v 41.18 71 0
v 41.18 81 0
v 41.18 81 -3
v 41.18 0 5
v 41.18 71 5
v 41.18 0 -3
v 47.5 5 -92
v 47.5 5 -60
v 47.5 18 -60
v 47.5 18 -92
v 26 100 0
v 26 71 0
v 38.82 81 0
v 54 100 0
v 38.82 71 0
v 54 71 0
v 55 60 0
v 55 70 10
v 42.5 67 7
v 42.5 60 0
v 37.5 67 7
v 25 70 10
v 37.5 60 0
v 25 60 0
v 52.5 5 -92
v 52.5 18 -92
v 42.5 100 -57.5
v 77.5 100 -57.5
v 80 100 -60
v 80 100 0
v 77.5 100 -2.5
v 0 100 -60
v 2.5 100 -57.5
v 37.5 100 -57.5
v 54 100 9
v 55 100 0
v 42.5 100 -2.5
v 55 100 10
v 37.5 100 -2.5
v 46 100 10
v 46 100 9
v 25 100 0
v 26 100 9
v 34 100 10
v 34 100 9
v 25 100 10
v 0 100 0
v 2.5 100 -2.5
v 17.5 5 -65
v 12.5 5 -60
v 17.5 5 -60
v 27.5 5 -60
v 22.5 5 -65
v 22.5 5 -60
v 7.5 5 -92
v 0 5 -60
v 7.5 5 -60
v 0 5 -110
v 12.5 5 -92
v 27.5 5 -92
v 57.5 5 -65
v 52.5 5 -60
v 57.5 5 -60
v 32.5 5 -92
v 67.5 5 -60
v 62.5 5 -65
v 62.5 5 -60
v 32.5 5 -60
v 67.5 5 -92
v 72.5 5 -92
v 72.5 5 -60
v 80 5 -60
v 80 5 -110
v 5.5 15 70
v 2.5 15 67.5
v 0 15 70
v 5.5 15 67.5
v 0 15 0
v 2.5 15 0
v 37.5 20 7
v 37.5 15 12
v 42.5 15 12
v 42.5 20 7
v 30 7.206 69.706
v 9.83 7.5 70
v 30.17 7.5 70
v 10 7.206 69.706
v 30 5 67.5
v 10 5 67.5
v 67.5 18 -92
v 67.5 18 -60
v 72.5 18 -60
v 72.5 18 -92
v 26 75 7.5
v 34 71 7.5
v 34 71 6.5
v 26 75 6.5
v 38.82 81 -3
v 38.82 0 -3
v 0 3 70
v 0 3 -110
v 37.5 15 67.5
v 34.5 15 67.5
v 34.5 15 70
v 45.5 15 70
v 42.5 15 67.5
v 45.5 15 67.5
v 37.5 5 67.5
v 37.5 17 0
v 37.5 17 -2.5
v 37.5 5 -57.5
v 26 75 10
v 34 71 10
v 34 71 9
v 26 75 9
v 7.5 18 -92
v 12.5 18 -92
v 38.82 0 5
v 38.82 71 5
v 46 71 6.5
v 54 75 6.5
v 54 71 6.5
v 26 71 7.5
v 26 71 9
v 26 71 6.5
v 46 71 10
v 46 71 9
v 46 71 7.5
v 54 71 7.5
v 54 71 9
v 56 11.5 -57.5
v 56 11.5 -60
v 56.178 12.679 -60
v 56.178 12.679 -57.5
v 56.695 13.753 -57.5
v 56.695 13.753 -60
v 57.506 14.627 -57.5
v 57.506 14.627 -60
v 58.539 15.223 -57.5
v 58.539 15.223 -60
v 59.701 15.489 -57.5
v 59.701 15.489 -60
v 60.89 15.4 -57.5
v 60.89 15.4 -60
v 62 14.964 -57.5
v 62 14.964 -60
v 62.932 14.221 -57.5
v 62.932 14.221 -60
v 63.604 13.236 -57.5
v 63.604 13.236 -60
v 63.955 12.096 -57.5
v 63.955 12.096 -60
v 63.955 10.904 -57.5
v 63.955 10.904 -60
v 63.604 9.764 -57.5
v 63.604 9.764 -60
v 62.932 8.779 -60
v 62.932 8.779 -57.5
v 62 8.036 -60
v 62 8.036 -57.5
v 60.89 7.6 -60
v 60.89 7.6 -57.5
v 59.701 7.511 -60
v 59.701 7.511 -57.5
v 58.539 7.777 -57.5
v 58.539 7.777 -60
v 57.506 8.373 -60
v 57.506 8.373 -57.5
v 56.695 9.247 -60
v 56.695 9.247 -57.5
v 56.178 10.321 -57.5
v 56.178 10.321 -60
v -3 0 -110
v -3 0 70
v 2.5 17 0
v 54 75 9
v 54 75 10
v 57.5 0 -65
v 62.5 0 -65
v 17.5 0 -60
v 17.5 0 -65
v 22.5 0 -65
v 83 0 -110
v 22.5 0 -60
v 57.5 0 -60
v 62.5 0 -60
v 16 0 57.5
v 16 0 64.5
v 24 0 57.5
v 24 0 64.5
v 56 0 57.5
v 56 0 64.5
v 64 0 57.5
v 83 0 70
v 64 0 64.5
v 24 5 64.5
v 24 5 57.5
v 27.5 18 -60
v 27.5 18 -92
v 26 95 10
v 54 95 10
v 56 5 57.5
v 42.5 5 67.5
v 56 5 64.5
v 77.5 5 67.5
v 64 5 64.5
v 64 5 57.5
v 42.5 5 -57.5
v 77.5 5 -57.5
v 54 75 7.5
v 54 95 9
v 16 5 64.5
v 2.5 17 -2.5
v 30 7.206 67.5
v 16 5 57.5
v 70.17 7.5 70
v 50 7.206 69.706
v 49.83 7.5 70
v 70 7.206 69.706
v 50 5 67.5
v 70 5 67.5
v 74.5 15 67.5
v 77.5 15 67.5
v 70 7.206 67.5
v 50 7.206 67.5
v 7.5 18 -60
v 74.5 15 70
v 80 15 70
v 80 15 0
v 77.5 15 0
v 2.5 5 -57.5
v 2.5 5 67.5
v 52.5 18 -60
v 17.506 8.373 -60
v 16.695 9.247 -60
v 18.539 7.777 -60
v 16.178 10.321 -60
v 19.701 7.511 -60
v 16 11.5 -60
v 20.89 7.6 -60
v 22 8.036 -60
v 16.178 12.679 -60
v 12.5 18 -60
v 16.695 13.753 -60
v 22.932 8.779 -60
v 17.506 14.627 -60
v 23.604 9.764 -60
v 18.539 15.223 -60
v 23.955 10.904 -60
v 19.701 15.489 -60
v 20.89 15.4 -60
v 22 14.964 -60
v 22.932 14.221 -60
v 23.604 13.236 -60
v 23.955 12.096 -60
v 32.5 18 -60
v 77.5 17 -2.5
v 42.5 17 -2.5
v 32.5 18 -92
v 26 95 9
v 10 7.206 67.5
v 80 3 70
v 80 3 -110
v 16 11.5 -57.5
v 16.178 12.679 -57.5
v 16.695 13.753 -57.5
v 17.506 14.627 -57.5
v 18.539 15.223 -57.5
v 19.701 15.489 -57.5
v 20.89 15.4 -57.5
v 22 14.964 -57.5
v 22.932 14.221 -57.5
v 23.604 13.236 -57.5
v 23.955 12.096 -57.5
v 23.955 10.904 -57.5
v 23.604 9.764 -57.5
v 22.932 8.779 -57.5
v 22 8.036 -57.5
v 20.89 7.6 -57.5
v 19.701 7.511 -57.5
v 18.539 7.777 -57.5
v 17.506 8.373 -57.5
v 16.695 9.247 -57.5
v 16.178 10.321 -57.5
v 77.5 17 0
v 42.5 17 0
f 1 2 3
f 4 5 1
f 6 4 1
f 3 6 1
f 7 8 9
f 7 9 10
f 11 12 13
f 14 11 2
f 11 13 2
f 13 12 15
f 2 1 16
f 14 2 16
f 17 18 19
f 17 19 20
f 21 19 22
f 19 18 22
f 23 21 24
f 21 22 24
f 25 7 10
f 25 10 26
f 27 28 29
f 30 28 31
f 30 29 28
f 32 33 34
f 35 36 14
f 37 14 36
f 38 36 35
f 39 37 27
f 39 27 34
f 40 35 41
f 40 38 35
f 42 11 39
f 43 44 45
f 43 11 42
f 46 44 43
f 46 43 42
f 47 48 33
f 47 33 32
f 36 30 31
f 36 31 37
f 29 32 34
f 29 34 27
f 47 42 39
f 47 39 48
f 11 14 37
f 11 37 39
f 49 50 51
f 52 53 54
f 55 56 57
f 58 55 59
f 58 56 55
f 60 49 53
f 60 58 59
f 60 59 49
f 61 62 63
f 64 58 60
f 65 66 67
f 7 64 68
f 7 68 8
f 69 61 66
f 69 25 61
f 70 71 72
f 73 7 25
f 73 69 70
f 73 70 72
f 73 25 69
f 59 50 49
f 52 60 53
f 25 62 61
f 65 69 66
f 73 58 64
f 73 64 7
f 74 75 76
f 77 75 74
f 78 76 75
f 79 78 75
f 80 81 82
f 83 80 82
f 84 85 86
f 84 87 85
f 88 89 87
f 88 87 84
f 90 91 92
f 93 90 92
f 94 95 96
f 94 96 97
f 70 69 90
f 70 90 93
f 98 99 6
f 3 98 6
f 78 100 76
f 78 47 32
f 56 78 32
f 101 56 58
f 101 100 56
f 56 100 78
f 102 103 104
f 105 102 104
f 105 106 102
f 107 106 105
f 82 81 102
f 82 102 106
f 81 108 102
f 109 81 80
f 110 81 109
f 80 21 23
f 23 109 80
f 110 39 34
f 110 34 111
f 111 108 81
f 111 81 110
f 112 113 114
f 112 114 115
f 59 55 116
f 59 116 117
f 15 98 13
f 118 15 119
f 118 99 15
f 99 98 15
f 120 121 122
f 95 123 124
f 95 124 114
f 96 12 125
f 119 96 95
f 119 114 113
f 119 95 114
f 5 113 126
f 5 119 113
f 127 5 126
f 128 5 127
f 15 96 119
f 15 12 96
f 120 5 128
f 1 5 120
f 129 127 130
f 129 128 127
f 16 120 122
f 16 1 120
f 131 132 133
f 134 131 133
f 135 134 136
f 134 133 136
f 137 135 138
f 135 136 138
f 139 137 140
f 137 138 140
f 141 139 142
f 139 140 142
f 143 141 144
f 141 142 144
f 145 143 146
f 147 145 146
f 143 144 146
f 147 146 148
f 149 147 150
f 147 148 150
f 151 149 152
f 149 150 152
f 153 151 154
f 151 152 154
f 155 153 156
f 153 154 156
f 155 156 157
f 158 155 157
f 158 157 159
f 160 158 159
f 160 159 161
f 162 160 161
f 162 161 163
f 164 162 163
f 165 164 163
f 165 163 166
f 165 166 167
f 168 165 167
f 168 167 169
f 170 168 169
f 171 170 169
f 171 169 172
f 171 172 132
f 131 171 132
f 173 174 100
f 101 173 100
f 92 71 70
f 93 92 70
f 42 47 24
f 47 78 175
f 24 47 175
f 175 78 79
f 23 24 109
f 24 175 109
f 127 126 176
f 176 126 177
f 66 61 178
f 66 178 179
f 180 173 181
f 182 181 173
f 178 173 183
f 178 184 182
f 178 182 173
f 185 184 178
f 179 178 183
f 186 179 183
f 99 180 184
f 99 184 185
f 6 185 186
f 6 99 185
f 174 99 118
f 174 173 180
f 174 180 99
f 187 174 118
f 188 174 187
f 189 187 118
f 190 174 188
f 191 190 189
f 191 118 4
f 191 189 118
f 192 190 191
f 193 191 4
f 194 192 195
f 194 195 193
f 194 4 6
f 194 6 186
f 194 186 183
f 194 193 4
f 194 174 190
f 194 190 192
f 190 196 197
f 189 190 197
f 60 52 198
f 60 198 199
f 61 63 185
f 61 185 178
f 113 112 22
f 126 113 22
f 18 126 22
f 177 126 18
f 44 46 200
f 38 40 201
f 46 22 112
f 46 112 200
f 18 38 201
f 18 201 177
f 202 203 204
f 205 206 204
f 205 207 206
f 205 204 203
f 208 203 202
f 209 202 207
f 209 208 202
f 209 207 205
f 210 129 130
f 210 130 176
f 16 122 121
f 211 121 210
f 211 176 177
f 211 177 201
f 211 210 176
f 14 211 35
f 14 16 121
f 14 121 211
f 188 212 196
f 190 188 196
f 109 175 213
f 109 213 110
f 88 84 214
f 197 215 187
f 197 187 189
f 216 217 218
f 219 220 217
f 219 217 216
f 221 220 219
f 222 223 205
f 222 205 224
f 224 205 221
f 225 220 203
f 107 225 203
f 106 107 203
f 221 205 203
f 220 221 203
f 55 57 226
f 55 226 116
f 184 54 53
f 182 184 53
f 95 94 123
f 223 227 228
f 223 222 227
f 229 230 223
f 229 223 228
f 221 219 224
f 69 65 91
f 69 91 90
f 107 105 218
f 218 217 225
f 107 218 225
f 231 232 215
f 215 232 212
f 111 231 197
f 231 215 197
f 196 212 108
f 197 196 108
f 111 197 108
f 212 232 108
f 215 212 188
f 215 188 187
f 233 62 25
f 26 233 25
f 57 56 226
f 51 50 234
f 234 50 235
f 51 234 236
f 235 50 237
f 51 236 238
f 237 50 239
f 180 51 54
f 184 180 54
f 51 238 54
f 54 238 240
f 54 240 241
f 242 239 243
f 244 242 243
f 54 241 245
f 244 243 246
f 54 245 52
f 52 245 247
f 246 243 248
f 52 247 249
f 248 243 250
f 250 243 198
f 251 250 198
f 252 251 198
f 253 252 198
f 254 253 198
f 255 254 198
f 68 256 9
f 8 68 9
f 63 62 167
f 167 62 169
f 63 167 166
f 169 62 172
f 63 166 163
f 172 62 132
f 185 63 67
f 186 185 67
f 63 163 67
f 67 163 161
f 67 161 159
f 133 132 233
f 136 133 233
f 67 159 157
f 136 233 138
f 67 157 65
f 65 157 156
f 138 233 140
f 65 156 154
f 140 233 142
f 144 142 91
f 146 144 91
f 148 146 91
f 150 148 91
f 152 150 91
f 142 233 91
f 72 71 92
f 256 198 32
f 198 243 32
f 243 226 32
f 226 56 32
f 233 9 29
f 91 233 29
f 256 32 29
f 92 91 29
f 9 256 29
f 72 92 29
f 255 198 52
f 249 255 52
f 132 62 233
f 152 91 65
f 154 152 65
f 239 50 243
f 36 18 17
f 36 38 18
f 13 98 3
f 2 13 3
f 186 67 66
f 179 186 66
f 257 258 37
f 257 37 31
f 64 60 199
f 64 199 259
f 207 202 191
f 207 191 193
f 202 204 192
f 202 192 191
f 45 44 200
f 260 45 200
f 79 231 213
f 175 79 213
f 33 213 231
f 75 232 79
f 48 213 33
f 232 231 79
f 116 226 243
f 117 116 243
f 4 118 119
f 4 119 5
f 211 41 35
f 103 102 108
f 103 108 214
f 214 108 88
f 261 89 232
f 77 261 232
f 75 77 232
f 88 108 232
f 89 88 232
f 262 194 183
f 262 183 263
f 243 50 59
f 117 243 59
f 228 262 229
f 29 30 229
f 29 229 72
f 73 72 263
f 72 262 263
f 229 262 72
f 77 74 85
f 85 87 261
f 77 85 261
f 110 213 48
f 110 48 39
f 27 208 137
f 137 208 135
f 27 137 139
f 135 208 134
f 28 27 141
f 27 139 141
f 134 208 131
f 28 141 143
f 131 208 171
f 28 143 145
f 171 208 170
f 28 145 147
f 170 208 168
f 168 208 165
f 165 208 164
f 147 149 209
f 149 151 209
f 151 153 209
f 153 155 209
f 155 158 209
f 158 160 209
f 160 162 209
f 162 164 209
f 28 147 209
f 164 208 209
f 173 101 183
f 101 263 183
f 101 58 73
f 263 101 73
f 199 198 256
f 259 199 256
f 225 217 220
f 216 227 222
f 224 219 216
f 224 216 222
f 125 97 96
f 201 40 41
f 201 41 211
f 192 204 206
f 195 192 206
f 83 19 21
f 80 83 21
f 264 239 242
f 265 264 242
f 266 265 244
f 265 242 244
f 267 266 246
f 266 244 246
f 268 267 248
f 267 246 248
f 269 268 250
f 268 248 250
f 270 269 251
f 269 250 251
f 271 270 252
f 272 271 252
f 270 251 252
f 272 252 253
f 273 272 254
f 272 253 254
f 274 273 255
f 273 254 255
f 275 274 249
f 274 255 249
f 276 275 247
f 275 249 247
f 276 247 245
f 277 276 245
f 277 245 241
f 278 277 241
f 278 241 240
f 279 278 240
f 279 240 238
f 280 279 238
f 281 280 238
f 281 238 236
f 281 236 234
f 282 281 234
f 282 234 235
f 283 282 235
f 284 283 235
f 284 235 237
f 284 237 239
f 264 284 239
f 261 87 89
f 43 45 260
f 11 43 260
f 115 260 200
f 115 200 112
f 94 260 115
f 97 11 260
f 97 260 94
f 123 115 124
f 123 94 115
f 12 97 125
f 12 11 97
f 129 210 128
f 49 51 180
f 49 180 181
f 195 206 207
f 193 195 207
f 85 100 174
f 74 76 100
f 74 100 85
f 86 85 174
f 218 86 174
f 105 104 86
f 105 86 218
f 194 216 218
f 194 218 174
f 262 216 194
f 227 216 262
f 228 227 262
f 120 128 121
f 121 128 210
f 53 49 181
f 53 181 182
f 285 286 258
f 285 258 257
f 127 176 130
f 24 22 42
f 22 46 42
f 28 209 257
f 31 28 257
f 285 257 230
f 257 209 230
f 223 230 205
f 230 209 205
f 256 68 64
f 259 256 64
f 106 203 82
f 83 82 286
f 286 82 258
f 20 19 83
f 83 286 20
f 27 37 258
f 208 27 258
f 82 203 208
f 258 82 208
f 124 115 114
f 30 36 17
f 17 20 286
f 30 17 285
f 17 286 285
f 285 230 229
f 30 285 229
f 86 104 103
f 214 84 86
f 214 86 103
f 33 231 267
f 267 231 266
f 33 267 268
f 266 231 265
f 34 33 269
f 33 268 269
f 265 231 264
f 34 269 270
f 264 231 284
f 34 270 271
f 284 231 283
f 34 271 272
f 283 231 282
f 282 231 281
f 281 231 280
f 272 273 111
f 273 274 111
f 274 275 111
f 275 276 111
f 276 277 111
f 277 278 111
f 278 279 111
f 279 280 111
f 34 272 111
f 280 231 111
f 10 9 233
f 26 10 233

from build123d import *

# Parameters (mm, degrees)
SKETCH1_W                                 = 80
SKETCH1_H                                 = 60
BOSS_EXTRUDE1_DEPTH                       = 100
CUT_EXTRUDE1_START                        = 5
SKETCH2_W                                 = 35
SKETCH2_H                                 = 55
CUT_EXTRUDE1_DEPTH                        = 95
SKETCH3_W                                 = 80
SKETCH3_H                                 = 5
BOSS_EXTRUDE2_DEPTH                       = 70
BOSS_EXTRUDE3_DEPTH                       = 10
SKETCH5_W                                 = 20
SKETCH5_H                                 = 2.5
CUT_EXTRUDE2_DEPTH                        = 7.5
SKETCH6_W                                 = 35
SKETCH6_H                                 = 12
CUT_EXTRUDE4_DEPTH                        = 57.5
CUT_EXTRUDE6_REACH                        = 184.483
SKETCH7_R                                 = 4
SKETCH9_W                                 = 80
SKETCH9_H                                 = 50
BOSS_EXTRUDE4_DEPTH                       = 5
SKETCH13_W                                = 8
SKETCH13_H                                = 7
CUT_EXTRUDE8_BUTTON_HOLES_DEPTH           = 166.90660023
BOSS_EXTRUDE5_OLED_MOUNT_DEPTH            = 10
BOSS_EXTRUDE6_OLED_MOUNT_DEPTH            = 1
BOSS_EXTRUDE7_START                       = -2.5
BOSS_EXTRUDE7_OLED_MOUNT_DEPTH            = 1
BOSS_EXTRUDE8_OLED_MOUNT_DEPTH            = 1
BOSS_EXTRUDE13_OLED_MOUNT_SUPPORT_DEPTH   = 30
CUT_EXTRUDE9_OLED_CABLE_DEPTH             = 10
CUT_EXTRUDE9_OLED_CABLE_DEPTH_BACK        = 154.430766146
SKETCH18_W                                = 2.36
SKETCH18_H                                = 8
BOSS_EXTRUDE12_OLED_CABLE_GUIDE_REACH     = 162.39
SKETCH20_W                                = 5
SKETCH20_H                                = 5
CUT_EXTRUDE10_SOLENOID_WIRE_HOLE_DEPTH    = 166.90660023
SKETCH21_W                                = 5
SKETCH21_H                                = 32
BOSS_EXTRUDE9_SOLENOID_SIDE_SUPPORT_DEPTH = 13
CHAMFER3_THUMB_SIZE                       = 2.5
CHAMFER5_THUMB_SIZE                       = 4.5
CHAMFER5_THUMB_SIZE2                      = 7.794228634
CHAMFER5_THUMB_PART_2_SIZE                = 4.5
CHAMFER5_THUMB_PART_2_SIZE2               = 7.794228634
CHAMFER5_THUMB_PART_3_SIZE                = 4.5
CHAMFER5_THUMB_PART_3_SIZE2               = 7.794228634
BOSS_EXTRUDE5_GUIDE_DEPTH                 = 180
SKETCH49_W                                = 5
SKETCH49_H                                = 5
BOSS_EXTRUDE14_DEPTH                      = 5
CHAMFER8_SIZE                             = 5


with BuildPart() as part:
    # Sketch1 → Boss-Extrude1 (new body)
    with BuildSketch(Plane(origin=(0, 0, 0), x_dir=(1, 0, 0), z_dir=(0, 1, 0))):
        with Locations((40, 30)):
            Rectangle(SKETCH1_W, SKETCH1_H)
    extrude(amount=BOSS_EXTRUDE1_DEPTH)

    # Sketch2 → Cut-Extrude1 (cut)
    with BuildSketch(Plane(origin=(0, 0, 0), x_dir=(1, 0, 0), z_dir=(0, 1, 0)).offset(CUT_EXTRUDE1_START)):
        with Locations((20, 30)):
            Rectangle(SKETCH2_W, SKETCH2_H)
        with Locations((60, 30)):
            Rectangle(SKETCH2_W, SKETCH2_H)
    extrude(amount=CUT_EXTRUDE1_DEPTH, mode=Mode.SUBTRACT)

    # Sketch3 → Boss-Extrude2 (add)
    with BuildSketch(Plane.XY):
        with Locations((40, 2.5)):
            Rectangle(SKETCH3_W, SKETCH3_H)
    extrude(amount=BOSS_EXTRUDE2_DEPTH)

    # Sketch4 → Boss-Extrude3 (add)
    with BuildSketch(Plane(origin=(0, 5, 0), x_dir=(1, 0, 0), z_dir=(0, 1, 0))):
        Polygon((80, 0), (77.5, 0), (77.5, -67.5), (42.5, -67.5), (42.5, 0), (37.5, 0), (37.5, -67.5), (2.5, -67.5), (2.5, 0), (0, 0), (0, -70), (80, -70), align=None)
    extrude(amount=BOSS_EXTRUDE3_DEPTH)

    # Sketch5 → Cut-Extrude2 (cut)
    with BuildSketch(Plane(origin=(0, 15, 0), x_dir=(1, 0, 0), z_dir=(0, 1, 0))):
        with Locations((20, -68.75)):
            Rectangle(SKETCH5_W, SKETCH5_H)
        with Locations((60, -68.75)):
            Rectangle(SKETCH5_W, SKETCH5_H)
    extrude(amount=-CUT_EXTRUDE2_DEPTH, mode=Mode.SUBTRACT)

    # Sketch6 → Cut-Extrude4 (cut)
    with BuildSketch(Plane.XY):
        with Locations((20, 11)):
            Rectangle(SKETCH6_W, SKETCH6_H)
        with Locations((60, 11)):
            Rectangle(SKETCH6_W, SKETCH6_H)
    extrude(amount=-CUT_EXTRUDE4_DEPTH, mode=Mode.SUBTRACT)

    # Sketch7 → Cut-Extrude6 (cut, up to next)
    with BuildSketch(Plane(origin=(0, 0, -60), x_dir=(-1, 0, 0), z_dir=(0, 0, -1)), mode=Mode.PRIVATE) as cut_extrude6_sk1:
        with Locations((-20, 11.5)):
            Circle(SKETCH7_R)
    cut_extrude6_tool1 = extrude(cut_extrude6_sk1.sketch, amount=-CUT_EXTRUDE6_REACH, mode=Mode.PRIVATE) & part.part
    # Sketch7 → Cut-Extrude6 (cut, up to next)
    with BuildSketch(Plane(origin=(0, 0, -60), x_dir=(-1, 0, 0), z_dir=(0, 0, -1)), mode=Mode.PRIVATE) as cut_extrude6_sk2:
        with Locations((-60, 11.5)):
            Circle(SKETCH7_R)
    cut_extrude6_tool2 = extrude(cut_extrude6_sk2.sketch, amount=-CUT_EXTRUDE6_REACH, mode=Mode.PRIVATE) & part.part
    add(cut_extrude6_tool1.solids().sort_by_distance((20, 11.5, -60))[0], mode=Mode.SUBTRACT)
    add(cut_extrude6_tool2.solids().sort_by_distance((60, 11.5, -60))[0], mode=Mode.SUBTRACT)

    # Sketch9 → Boss-Extrude4 (add)
    with BuildSketch(Plane(origin=(0, 0, 0), x_dir=(1, 0, 0), z_dir=(0, 1, 0))):
        with Locations((40, 85)):
            Rectangle(SKETCH9_W, SKETCH9_H)
    extrude(amount=BOSS_EXTRUDE4_DEPTH)

    # Sketch13 → Cut-Extrude8 (Button Holes) (cut, through all)
    with BuildSketch(Plane(origin=(0, 5, 0), x_dir=(1, 0, 0), z_dir=(0, 1, 0))):
        with Locations((20, -61)):
            Rectangle(SKETCH13_W, SKETCH13_H)
        with Locations((60, -61)):
            Rectangle(SKETCH13_W, SKETCH13_H)
    extrude(amount=-CUT_EXTRUDE8_BUTTON_HOLES_DEPTH, mode=Mode.SUBTRACT)

    # Sketch14 → Boss-Extrude5 (OLED Mount) (add)
    with BuildSketch(Plane.XY):
        Polygon((25, 100), (26, 100), (26, 71), (54, 71), (54, 100), (55, 100), (55, 70), (54, 70), (26, 70), (25, 70), align=None)
    extrude(amount=BOSS_EXTRUDE5_OLED_MOUNT_DEPTH)

    # Sketch15 → Boss-Extrude6 (OLED Mount) (add)
    with BuildSketch(Plane.XY.offset(10)):
        Polygon((26, 71), (34, 71), (26, 75), align=None)
        Polygon((54, 75), (54, 71), (46, 71), align=None)
    extrude(amount=-BOSS_EXTRUDE6_OLED_MOUNT_DEPTH)

    # Sketch15<2> → Boss-Extrude7 (OLED Mount) (add)
    with BuildSketch(Plane.XY.offset(10).offset(BOSS_EXTRUDE7_START)):
        Polygon((26, 71), (34, 71), (26, 75), align=None)
        Polygon((54, 75), (54, 71), (46, 71), align=None)
    extrude(amount=-BOSS_EXTRUDE7_OLED_MOUNT_DEPTH)

    # Sketch17 → Boss-Extrude8 (OLED Mount) (add)
    with BuildSketch(Plane.XY.offset(10)):
        Polygon((54, 95), (54, 100), (46, 100), align=None)
        Polygon((26, 100), (34, 100), (26, 95), align=None)
    extrude(amount=-BOSS_EXTRUDE8_OLED_MOUNT_DEPTH)

    # Sketch32 → Boss-Extrude13 OLED Mount Support) (add)
    with BuildSketch(Plane.ZY.offset(-25)):
        Polygon((0, 70), (10, 70), (0, 60), align=None)
    extrude(amount=-BOSS_EXTRUDE13_OLED_MOUNT_SUPPORT_DEPTH)

    # Sketch18 → Cut-Extrude9 (OLED Cable) (cut, two sides: drawn at the far end of the back side and taken through both)
    with BuildSketch(Plane(origin=(0, 71, 0), x_dir=(1, 0, 0), z_dir=(0, 1, 0)).offset(-CUT_EXTRUDE9_OLED_CABLE_DEPTH_BACK)):
        with Locations((40, -1)):
            Rectangle(SKETCH18_W, SKETCH18_H)
    extrude(amount=CUT_EXTRUDE9_OLED_CABLE_DEPTH + CUT_EXTRUDE9_OLED_CABLE_DEPTH_BACK, mode=Mode.SUBTRACT)

    # Boss-Extrude12 (OLED Cable Guide): up to this plane
    boss_extrude12_oled_cable_guide_end = Plane(origin=(55, 70, 10), z_dir=(0, -0.7071067811865477, 0.7071067811865474))
    # Sketch31 → Boss-Extrude12 (OLED Cable Guide) (add, up to the surface)
    with BuildSketch(Plane(origin=(0, 15, 0), x_dir=(1, 0, 0), z_dir=(0, 1, 0)), mode=Mode.PRIVATE) as boss_extrude12_oled_cable_guide_sk1:
        Polygon((37.5, 0), (38.82, 0), (38.82, -5), (41.18, -5), (41.18, 0), (42.5, 0), (42.5, -7), (37.5, -7), align=None)
    boss_extrude12_oled_cable_guide_tool1 = split(extrude(boss_extrude12_oled_cable_guide_sk1.sketch, amount=BOSS_EXTRUDE12_OLED_CABLE_GUIDE_REACH, mode=Mode.PRIVATE), bisect_by=boss_extrude12_oled_cable_guide_end, keep=Keep.BOTH, mode=Mode.PRIVATE)
    add(boss_extrude12_oled_cable_guide_tool1.solids().sort_by_distance((38.16, 15, 0.086023))[0])

    # Sketch20 → Cut-Extrude10 (Solenoid Wire Hole) (cut, through all)
    with BuildSketch(Plane(origin=(0, 5, 0), x_dir=(1, 0, 0), z_dir=(0, 1, 0))):
        with Locations((60, 62.5)):
            Rectangle(SKETCH20_W, SKETCH20_H)
        with Locations((20, 62.5)):
            Rectangle(SKETCH20_W, SKETCH20_H)
    extrude(amount=-CUT_EXTRUDE10_SOLENOID_WIRE_HOLE_DEPTH, mode=Mode.SUBTRACT)

    # Sketch21 → Boss-Extrude9 (Solenoid Side Support) (add)
    with BuildSketch(Plane(origin=(0, 5, 0), x_dir=(1, 0, 0), z_dir=(0, 1, 0))):
        with Locations((70, 76)):
            Rectangle(SKETCH21_W, SKETCH21_H)
        with Locations((50, 76)):
            Rectangle(SKETCH21_W, SKETCH21_H)
        with Locations((30, 76)):
            Rectangle(SKETCH21_W, SKETCH21_H)
        with Locations((10, 76)):
            Rectangle(SKETCH21_W, SKETCH21_H)
    extrude(amount=BOSS_EXTRUDE9_SOLENOID_SIDE_SUPPORT_DEPTH)

    # Chamfer3 (Thumb)
    chamfer3_thumb_edges = [part.edges().sort_by_distance(p)[0] for p in [
        (20, 7.5, 67.5),
        (60, 7.5, 67.5),
    ]]
    chamfer(chamfer3_thumb_edges, length=CHAMFER3_THUMB_SIZE - 0.0001)  # a hair under: the kernel refuses the full size

    # Chamfer5 (Thumb)
    chamfer5_thumb_edges = [part.edges().sort_by_distance(p)[0] for p in [
        (70, 15, 68.75),
    ]]
    chamfer5_thumb_side = [part.faces().sort_by_distance(p)[0] for p in [
        (78.266129032, 15, 38.266129032),
    ]]
    chamfer(chamfer5_thumb_edges, length=CHAMFER5_THUMB_SIZE, length2=CHAMFER5_THUMB_SIZE2, reference=chamfer5_thumb_side[0])

    # Chamfer5 (Thumb) part 2
    chamfer5_thumb_part_2_edges = [part.edges().sort_by_distance(p)[0] for p in [
        (50, 15, 68.75),
        (30, 15, 68.75),
    ]]
    chamfer5_thumb_part_2_side = [part.faces().sort_by_distance(p)[0] for p in [
        (40, 15, 41.718085106),
    ]]
    chamfer(chamfer5_thumb_part_2_edges, length=CHAMFER5_THUMB_PART_2_SIZE, length2=CHAMFER5_THUMB_PART_2_SIZE2, reference=chamfer5_thumb_part_2_side[0])

    # Chamfer5 (Thumb) part 3
    chamfer5_thumb_part_3_edges = [part.edges().sort_by_distance(p)[0] for p in [
        (10, 15, 68.75),
    ]]
    chamfer5_thumb_part_3_side = [part.faces().sort_by_distance(p)[0] for p in [
        (1.733870968, 15, 38.266129032),
    ]]
    chamfer(chamfer5_thumb_part_3_edges, length=CHAMFER5_THUMB_PART_3_SIZE, length2=CHAMFER5_THUMB_PART_3_SIZE2, reference=chamfer5_thumb_part_3_side[0])

    # Sketch37 → Boss-Extrude5 (Guide) (add, through all)
    with BuildSketch(Plane.XY.offset(70)):
        Polygon((80, 0), (83, 0), (80, 3), align=None)
        Polygon((0, 0), (-3, 0), (0, 3), align=None)
    extrude(amount=-BOSS_EXTRUDE5_GUIDE_DEPTH)

    # Sketch49 → Boss-Extrude14 (add)
    with BuildSketch(Plane(origin=(0, 15, 0), x_dir=(1, 0, 0), z_dir=(0, 1, 0))):
        with Locations((40, -9.5)):
            Rectangle(SKETCH49_W, SKETCH49_H)
    extrude(amount=BOSS_EXTRUDE14_DEPTH)

    # Chamfer8
    chamfer8_edges = [part.edges().sort_by_distance(p)[0] for p in [
        (40, 20, 12),
    ]]
    chamfer(chamfer8_edges, length=CHAMFER8_SIZE - 0.0001)  # a hair under: the kernel refuses the full size


solid = part.part
